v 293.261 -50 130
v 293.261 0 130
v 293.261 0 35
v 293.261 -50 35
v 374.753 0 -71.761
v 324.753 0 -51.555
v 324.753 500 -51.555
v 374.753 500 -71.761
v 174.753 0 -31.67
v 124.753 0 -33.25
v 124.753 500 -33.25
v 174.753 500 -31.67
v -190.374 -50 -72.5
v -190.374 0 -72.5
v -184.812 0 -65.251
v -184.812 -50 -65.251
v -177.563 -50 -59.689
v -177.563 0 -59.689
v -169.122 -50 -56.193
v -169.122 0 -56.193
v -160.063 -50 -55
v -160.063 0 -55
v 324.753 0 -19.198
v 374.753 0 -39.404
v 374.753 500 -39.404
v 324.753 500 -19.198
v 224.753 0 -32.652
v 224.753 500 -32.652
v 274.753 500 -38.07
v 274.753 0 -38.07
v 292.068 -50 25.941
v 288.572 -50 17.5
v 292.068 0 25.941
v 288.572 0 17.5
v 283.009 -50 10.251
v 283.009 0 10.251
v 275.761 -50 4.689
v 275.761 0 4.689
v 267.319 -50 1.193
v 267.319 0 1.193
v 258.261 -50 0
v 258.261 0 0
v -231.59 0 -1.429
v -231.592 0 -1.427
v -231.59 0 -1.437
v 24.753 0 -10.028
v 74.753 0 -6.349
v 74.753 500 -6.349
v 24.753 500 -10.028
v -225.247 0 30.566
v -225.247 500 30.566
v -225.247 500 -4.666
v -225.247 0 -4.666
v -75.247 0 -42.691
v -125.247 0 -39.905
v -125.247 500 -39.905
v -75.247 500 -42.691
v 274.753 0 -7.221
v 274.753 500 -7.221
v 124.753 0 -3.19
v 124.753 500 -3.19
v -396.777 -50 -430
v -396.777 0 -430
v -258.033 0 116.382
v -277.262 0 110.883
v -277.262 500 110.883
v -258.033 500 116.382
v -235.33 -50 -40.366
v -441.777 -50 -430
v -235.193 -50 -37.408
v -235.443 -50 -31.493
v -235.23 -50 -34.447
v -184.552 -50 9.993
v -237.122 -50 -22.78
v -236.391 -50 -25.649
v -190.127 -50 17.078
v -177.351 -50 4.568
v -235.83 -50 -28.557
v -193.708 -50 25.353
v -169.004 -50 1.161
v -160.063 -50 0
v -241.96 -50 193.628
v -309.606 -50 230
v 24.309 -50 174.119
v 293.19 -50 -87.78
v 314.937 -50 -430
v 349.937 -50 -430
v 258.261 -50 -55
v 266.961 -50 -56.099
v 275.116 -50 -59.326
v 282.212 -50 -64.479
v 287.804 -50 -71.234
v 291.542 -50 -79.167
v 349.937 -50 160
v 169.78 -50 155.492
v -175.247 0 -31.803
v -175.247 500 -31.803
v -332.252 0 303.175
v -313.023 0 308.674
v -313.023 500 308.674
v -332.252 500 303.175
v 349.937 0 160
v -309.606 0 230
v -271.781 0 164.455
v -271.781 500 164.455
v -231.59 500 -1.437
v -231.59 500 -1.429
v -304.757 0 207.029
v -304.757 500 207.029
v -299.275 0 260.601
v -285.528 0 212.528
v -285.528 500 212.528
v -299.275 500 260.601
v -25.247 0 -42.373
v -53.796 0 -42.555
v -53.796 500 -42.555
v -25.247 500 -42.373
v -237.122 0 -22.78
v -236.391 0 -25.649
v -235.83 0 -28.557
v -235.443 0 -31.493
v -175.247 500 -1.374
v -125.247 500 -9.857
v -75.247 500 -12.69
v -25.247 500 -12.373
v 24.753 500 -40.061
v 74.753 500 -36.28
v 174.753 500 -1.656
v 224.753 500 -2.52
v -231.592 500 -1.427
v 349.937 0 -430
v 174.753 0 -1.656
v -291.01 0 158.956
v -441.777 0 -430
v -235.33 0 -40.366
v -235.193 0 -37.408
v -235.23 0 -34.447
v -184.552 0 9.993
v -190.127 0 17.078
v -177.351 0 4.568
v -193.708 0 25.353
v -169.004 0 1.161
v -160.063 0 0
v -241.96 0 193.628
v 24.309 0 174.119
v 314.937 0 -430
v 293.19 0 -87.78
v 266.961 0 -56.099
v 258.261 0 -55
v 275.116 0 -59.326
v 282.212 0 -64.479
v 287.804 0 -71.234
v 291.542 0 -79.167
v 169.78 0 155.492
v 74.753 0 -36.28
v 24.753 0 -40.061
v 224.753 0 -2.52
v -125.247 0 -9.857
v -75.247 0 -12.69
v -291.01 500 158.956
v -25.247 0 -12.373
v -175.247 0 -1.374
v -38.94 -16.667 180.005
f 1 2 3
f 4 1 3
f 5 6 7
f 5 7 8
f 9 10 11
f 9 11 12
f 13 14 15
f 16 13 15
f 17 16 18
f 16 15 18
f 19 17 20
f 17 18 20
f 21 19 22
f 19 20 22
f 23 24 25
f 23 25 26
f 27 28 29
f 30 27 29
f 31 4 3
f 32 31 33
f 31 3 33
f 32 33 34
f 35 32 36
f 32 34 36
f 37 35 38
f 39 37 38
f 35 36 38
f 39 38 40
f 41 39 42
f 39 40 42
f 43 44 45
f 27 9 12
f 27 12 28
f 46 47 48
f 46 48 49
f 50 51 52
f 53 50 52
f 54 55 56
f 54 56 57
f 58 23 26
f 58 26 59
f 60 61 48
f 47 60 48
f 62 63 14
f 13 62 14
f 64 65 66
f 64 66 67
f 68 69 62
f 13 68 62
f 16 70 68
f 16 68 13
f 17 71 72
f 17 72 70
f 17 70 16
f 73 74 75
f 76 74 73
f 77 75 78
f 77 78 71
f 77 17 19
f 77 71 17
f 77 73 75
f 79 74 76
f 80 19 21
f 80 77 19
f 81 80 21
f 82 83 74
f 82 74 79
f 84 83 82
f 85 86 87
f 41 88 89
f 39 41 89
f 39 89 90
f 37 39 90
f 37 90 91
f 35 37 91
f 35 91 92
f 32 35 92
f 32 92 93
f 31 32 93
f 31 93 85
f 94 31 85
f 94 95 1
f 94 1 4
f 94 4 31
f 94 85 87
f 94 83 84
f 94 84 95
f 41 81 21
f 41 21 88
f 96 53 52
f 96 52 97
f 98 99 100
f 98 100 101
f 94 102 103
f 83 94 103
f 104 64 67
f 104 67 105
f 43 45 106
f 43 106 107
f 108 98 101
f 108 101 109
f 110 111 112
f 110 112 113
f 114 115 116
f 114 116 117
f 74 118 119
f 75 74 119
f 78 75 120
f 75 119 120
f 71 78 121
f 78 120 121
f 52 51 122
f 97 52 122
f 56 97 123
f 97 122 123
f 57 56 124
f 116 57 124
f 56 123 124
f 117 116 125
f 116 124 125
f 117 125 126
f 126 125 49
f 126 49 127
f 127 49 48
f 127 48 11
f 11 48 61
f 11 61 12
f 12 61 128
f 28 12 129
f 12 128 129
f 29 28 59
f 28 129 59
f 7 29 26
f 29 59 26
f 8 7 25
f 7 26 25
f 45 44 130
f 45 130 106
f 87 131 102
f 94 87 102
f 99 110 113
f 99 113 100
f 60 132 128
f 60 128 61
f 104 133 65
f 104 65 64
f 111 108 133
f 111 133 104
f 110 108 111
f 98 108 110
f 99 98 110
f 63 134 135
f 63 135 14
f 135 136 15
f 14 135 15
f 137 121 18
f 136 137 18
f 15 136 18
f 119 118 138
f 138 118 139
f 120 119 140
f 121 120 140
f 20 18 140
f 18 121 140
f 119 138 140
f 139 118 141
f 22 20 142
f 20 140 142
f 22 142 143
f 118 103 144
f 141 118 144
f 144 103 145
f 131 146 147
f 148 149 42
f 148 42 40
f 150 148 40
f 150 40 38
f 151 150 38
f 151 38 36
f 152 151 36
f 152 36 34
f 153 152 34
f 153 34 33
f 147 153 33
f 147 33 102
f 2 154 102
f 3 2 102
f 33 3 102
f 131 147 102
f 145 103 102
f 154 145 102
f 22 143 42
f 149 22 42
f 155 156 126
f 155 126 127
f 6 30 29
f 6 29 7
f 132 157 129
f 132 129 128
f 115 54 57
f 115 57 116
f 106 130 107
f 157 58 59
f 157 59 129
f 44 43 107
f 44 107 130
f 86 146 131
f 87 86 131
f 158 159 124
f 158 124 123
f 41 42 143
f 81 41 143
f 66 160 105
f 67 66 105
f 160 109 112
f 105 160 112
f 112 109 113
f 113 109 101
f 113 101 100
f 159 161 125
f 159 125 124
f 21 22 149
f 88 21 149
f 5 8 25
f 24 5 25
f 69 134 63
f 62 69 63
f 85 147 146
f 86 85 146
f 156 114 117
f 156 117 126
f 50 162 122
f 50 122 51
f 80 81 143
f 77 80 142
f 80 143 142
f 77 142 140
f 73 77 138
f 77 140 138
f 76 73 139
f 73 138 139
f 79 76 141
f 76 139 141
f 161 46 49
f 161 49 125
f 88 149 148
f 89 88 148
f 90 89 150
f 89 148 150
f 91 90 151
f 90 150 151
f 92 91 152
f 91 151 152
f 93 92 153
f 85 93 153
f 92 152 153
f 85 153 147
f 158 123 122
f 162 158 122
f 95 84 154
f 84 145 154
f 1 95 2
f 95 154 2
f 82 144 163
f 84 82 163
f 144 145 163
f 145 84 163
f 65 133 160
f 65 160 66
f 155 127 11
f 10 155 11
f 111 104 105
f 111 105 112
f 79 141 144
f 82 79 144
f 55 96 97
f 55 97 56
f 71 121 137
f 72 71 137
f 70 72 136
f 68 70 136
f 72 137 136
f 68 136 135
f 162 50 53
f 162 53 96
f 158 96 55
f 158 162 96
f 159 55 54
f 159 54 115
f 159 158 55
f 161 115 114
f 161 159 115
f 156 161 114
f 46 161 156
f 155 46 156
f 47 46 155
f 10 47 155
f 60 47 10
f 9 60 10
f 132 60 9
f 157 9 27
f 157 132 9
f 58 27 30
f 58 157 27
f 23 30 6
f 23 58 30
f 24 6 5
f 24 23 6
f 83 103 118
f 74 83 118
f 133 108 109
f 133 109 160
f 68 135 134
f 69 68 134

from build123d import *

# Parameters (mm, degrees)
F2_DEPTH = 500
F3_DEPTH = 50


with BuildPart() as f2:
    # F1 (on Front) → F2 (new body)
    with BuildSketch(Plane.XZ):
        Polygon((-313.022685147, 308.6738246905), (-332.2518732106, 303.1748860281), (-318.5045265546, 255.101915869), (-299.275338491, 260.6008545314), align=None)
        Polygon((-299.275338491, 260.6008545314), (-318.5045265546, 255.101915869), (-304.7571798986, 207.0289457099), (-285.5279918349, 212.5278843723), align=None)
        Polygon((-285.5279918349, 212.5278843723), (-304.7571798986, 207.0289457099), (-291.0098332425, 158.9559755508), (-271.7806451789, 164.4549142132), align=None)
        Polygon((-271.7806451789, 164.4549142132), (-291.0098332425, 158.9559755508), (-277.2624865865, 110.8830053917), (-258.0332985228, 116.3819440541), align=None)
    extrude(amount=-F2_DEPTH)


with BuildPart() as f2b:
    # F1 (on Front) → F2, piece 2 (new body)
    with BuildSketch(Plane.XZ):
        Polygon((374.7528376444, -39.4042041541), (324.7528376444, -19.1975054732), (324.7528376444, -51.5547587832), (374.7528376444, -71.7614574641), align=None)
        Polygon((324.7528376444, -51.5547587832), (324.7528376444, -19.1975054732), (274.7528376444, -7.2214900208), (274.7528376444, -38.0700391051), align=None)
        Polygon((274.7528376444, -38.0700391051), (274.7528376444, -7.2214900208), (224.7528376444, -2.5200431725), (224.7528376444, -32.6523729345), align=None)
        Polygon((224.7528376444, -32.6523729345), (224.7528376444, -2.5200431725), (174.7528376444, -1.656131361), (174.7528376444, -31.670252785), align=None)
        Polygon((174.7528376444, -31.670252785), (174.7528376444, -1.656131361), (124.7528376444, -3.1904470413), (124.7528376444, -33.25025125), align=None)
        Polygon((124.7528376444, -33.25025125), (124.7528376444, -3.1904470413), (74.7528376444, -6.3491339475), (74.7528376444, -36.2796506691), align=None)
        Polygon((74.7528376444, -36.2796506691), (74.7528376444, -6.3491339475), (24.7528376444, -10.0282630796), (24.7528376444, -40.061218899), align=None)
        Polygon((24.7528376444, -40.061218899), (24.7528376444, -10.0282630796), (-25.2471623556, -12.3725440927), (-25.2471623556, -42.3731500731), align=None)
        with BuildLine():
            Line((-25.2471623556, -42.3731500731), (-25.2471623556, -12.3725440927))
            Line((-25.2471623556, -12.3725440927), (-60.3584851816, -12.5957126798))
            add(Edge.make_bspline(
                [(-60.3584851816, -12.5957126798), (-56.9180854904, -21.5284331632), (-55.115206892, -31.8869926762), (-53.7958883398, -42.5546066042)],
                knots=[0.8239164259, 0.8239164259, 0.8239164259, 0.8239164259, 0.9454560047, 0.9454560047, 0.9454560047, 0.9454560047], degree=3))
            Line((-53.7958883398, -42.5546066042), (-25.2471623556, -42.3731500731))
        make_face()
        with BuildLine():
            add(Edge.make_bspline(
                [(-60.3584851816, -12.5957126798), (-56.9180854904, -21.5284331632), (-55.115206892, -31.8869926762), (-53.7958883398, -42.5546066042)],
                knots=[0.8239164259, 0.8239164259, 0.8239164259, 0.8239164259, 0.9454560047, 0.9454560047, 0.9454560047, 0.9454560047], degree=3))
            Line((-60.3584851816, -12.5957126798), (-75.2471623556, -12.6903455441))
            Line((-75.2471623556, -12.6903455441), (-75.2471623556, -42.6909515245))
            Line((-75.2471623556, -42.6909515245), (-53.7958883398, -42.5546066042))
        make_face()
        with BuildLine():
            Line((-175.2471623556, -1.3737931919), (-185.149231833, 4.9516693116))
            add(Edge.make_bspline(
                [(-225.2471623556, 3.6267801279), (-218.5699288591, 0.1086035939), (-203.4752736384, 1.8377965797), (-185.149231833, 4.9516693116)],
                knots=[0.2038986096, 0.2038986096, 0.2038986096, 0.2038986096, 0.368291831, 0.368291831, 0.368291831, 0.368291831], degree=3))
            Line((-225.2471623556, 3.6267801279), (-225.2471623556, -4.6656222887))
            Line((-225.2471623556, -4.6656222887), (-175.2471623556, -31.8025045694))
            Line((-175.2471623556, -31.8025045694), (-175.2471623556, -1.3737931919))
        make_face()
        with BuildLine():
            add(Edge.make_bspline(
                [(-225.2471623556, 3.6267801279), (-218.5699288591, 0.1086035939), (-203.4752736384, 1.8377965797), (-185.149231833, 4.9516693116)],
                knots=[0.2038986096, 0.2038986096, 0.2038986096, 0.2038986096, 0.368291831, 0.368291831, 0.368291831, 0.368291831], degree=3))
            Line((-185.149231833, 4.9516693116), (-225.2471623556, 30.5663104296))
            Line((-225.2471623556, 30.5663104296), (-225.2471623556, 3.6267801279))
        make_face()
        Polygon((-75.2471623556, -42.6909515245), (-75.2471623556, -12.6903455441), (-125.2471623556, -9.8568606564), (-125.2471623556, -39.9049938626), align=None)
        Polygon((-125.2471623556, -9.8568606564), (-175.2471623556, -1.3737931919), (-175.2471623556, -31.8025045694), (-125.2471623556, -39.9049938626), align=None)
    extrude(amount=-F2_DEPTH)


with BuildPart() as f2c:
    # F1 (on Front) → F2, piece 3 (new body)
    with BuildSketch(Plane.XZ):
        Polygon((-231.5898423556, -1.4372480625), (-231.5898423556, -1.4286871489), (-231.5917925852, -1.4274861968), align=None)
    extrude(amount=-F2_DEPTH)


with BuildPart() as f3:
    # F0 (on Front) → F3 (new body)
    with BuildSketch(Plane.XZ):
        with BuildLine():
            ThreePointArc((-160.0633602421, -55), (-166.7365377228, -27.5), (-160.0633602421, 0))
            ThreePointArc((-160.0633602421, 0), (-181.1268860524, 7.0477571483), (-193.7075195999, 25.3526925464))
            Line((-193.7075195999, 25.3526925464), (-241.9597391517, 193.6281799587))
            Line((-241.9597391517, 193.6281799587), (-309.6056596926, 230))
            Line((-309.6056596926, 230), (-237.122271712, -22.7796141821))
            ThreePointArc((-237.122271712, -22.7796141821), (-236.0889018962, -27.0990222261), (-235.4429058376, -31.4930896038))
            ThreePointArc((-235.4429058376, -31.4930896038), (-235.1893804809, -35.9271468791), (-235.3303261555, -40.3662090936))
            Line((-235.3303261555, -40.3662090936), (-441.7769706098, -430))
            Line((-441.7769706098, -430), (-396.7769706098, -430))
            Line((-396.7769706098, -430), (-190.3742493745, -72.5))
            ThreePointArc((-190.3742493745, -72.5), (-177.5633602421, -59.6891108675), (-160.0633602421, -55))
        make_face()
        with BuildLine():
            Line((258.2606234636, 0), (-160.0633602421, 0))
            ThreePointArc((-160.0633602421, 0), (-166.7365377228, -27.5), (-160.0633602421, -55))
            Line((-160.0633602421, -55), (258.2606234636, -55))
            ThreePointArc((258.2606234636, -55), (264.9338009444, -27.5), (258.2606234636, 0))
        make_face()
        with BuildLine():
            ThreePointArc((293.2606234636, 35), (283.0093608052, 10.2512626585), (258.2606234636, 0))
            ThreePointArc((258.2606234636, 0), (264.9338009444, -27.5), (258.2606234636, -55))
            ThreePointArc((258.2606234636, -55), (282.2117573173, -64.4785739598), (293.1901715336, -87.7803893072))
            Line((293.1901715336, -87.7803893072), (314.9366397579, -430))
            Line((314.9366397579, -430), (348.9601495671, -430))
            Line((348.9601495671, -430), (349.7293803363, -430))
            Line((349.7293803363, -430), (349.9366397579, -430))
            Line((349.9366397579, -430), (349.9366397579, 112.6860928485))
            add(Edge.make_bspline(
                [(293.2606234636, 130), (313.447396449, 124.6358037529), (332.2966423185, 118.8506913972), (349.9366397579, 112.6860928485)],
                knots=[0.6174610646, 0.6174610646, 0.6174610646, 0.6174610646, 0.7111631147, 0.7111631147, 0.7111631147, 0.7111631147], degree=3))
            Line((293.2606234636, 130), (293.2606234636, 35))
        make_face()
        with BuildLine():
            Line((-309.6056596926, 230), (-241.9597391517, 193.6281799587))
            add(Edge.make_bspline(
                [(-241.9597391517, 193.6281799587), (-30.8653650886, 182.4185598631), (160.2374256996, 165.3480241113), (293.2606234636, 130)],
                knots=[0, 0, 0, 0, 0.6174610646, 0.6174610646, 0.6174610646, 0.6174610646], degree=3))
            Line((293.2606234636, 130), (349.9366397579, 160))
            Line((349.9366397579, 160), (-309.6056596926, 230))
        make_face()
        with BuildLine():
            Line((349.9366397579, 160), (293.2606234636, 130))
            add(Edge.make_bspline(
                [(293.2606234636, 130), (313.447396449, 124.6358037529), (332.2966423185, 118.8506913972), (349.9366397579, 112.6860928485)],
                knots=[0.6174610646, 0.6174610646, 0.6174610646, 0.6174610646, 0.7111631147, 0.7111631147, 0.7111631147, 0.7111631147], degree=3))
            Line((349.9366397579, 112.6860928485), (349.9366397579, 160))
        make_face()
    extrude(amount=F3_DEPTH)


solid = Compound([f2.part, f2b.part, f2c.part, f3.part])
